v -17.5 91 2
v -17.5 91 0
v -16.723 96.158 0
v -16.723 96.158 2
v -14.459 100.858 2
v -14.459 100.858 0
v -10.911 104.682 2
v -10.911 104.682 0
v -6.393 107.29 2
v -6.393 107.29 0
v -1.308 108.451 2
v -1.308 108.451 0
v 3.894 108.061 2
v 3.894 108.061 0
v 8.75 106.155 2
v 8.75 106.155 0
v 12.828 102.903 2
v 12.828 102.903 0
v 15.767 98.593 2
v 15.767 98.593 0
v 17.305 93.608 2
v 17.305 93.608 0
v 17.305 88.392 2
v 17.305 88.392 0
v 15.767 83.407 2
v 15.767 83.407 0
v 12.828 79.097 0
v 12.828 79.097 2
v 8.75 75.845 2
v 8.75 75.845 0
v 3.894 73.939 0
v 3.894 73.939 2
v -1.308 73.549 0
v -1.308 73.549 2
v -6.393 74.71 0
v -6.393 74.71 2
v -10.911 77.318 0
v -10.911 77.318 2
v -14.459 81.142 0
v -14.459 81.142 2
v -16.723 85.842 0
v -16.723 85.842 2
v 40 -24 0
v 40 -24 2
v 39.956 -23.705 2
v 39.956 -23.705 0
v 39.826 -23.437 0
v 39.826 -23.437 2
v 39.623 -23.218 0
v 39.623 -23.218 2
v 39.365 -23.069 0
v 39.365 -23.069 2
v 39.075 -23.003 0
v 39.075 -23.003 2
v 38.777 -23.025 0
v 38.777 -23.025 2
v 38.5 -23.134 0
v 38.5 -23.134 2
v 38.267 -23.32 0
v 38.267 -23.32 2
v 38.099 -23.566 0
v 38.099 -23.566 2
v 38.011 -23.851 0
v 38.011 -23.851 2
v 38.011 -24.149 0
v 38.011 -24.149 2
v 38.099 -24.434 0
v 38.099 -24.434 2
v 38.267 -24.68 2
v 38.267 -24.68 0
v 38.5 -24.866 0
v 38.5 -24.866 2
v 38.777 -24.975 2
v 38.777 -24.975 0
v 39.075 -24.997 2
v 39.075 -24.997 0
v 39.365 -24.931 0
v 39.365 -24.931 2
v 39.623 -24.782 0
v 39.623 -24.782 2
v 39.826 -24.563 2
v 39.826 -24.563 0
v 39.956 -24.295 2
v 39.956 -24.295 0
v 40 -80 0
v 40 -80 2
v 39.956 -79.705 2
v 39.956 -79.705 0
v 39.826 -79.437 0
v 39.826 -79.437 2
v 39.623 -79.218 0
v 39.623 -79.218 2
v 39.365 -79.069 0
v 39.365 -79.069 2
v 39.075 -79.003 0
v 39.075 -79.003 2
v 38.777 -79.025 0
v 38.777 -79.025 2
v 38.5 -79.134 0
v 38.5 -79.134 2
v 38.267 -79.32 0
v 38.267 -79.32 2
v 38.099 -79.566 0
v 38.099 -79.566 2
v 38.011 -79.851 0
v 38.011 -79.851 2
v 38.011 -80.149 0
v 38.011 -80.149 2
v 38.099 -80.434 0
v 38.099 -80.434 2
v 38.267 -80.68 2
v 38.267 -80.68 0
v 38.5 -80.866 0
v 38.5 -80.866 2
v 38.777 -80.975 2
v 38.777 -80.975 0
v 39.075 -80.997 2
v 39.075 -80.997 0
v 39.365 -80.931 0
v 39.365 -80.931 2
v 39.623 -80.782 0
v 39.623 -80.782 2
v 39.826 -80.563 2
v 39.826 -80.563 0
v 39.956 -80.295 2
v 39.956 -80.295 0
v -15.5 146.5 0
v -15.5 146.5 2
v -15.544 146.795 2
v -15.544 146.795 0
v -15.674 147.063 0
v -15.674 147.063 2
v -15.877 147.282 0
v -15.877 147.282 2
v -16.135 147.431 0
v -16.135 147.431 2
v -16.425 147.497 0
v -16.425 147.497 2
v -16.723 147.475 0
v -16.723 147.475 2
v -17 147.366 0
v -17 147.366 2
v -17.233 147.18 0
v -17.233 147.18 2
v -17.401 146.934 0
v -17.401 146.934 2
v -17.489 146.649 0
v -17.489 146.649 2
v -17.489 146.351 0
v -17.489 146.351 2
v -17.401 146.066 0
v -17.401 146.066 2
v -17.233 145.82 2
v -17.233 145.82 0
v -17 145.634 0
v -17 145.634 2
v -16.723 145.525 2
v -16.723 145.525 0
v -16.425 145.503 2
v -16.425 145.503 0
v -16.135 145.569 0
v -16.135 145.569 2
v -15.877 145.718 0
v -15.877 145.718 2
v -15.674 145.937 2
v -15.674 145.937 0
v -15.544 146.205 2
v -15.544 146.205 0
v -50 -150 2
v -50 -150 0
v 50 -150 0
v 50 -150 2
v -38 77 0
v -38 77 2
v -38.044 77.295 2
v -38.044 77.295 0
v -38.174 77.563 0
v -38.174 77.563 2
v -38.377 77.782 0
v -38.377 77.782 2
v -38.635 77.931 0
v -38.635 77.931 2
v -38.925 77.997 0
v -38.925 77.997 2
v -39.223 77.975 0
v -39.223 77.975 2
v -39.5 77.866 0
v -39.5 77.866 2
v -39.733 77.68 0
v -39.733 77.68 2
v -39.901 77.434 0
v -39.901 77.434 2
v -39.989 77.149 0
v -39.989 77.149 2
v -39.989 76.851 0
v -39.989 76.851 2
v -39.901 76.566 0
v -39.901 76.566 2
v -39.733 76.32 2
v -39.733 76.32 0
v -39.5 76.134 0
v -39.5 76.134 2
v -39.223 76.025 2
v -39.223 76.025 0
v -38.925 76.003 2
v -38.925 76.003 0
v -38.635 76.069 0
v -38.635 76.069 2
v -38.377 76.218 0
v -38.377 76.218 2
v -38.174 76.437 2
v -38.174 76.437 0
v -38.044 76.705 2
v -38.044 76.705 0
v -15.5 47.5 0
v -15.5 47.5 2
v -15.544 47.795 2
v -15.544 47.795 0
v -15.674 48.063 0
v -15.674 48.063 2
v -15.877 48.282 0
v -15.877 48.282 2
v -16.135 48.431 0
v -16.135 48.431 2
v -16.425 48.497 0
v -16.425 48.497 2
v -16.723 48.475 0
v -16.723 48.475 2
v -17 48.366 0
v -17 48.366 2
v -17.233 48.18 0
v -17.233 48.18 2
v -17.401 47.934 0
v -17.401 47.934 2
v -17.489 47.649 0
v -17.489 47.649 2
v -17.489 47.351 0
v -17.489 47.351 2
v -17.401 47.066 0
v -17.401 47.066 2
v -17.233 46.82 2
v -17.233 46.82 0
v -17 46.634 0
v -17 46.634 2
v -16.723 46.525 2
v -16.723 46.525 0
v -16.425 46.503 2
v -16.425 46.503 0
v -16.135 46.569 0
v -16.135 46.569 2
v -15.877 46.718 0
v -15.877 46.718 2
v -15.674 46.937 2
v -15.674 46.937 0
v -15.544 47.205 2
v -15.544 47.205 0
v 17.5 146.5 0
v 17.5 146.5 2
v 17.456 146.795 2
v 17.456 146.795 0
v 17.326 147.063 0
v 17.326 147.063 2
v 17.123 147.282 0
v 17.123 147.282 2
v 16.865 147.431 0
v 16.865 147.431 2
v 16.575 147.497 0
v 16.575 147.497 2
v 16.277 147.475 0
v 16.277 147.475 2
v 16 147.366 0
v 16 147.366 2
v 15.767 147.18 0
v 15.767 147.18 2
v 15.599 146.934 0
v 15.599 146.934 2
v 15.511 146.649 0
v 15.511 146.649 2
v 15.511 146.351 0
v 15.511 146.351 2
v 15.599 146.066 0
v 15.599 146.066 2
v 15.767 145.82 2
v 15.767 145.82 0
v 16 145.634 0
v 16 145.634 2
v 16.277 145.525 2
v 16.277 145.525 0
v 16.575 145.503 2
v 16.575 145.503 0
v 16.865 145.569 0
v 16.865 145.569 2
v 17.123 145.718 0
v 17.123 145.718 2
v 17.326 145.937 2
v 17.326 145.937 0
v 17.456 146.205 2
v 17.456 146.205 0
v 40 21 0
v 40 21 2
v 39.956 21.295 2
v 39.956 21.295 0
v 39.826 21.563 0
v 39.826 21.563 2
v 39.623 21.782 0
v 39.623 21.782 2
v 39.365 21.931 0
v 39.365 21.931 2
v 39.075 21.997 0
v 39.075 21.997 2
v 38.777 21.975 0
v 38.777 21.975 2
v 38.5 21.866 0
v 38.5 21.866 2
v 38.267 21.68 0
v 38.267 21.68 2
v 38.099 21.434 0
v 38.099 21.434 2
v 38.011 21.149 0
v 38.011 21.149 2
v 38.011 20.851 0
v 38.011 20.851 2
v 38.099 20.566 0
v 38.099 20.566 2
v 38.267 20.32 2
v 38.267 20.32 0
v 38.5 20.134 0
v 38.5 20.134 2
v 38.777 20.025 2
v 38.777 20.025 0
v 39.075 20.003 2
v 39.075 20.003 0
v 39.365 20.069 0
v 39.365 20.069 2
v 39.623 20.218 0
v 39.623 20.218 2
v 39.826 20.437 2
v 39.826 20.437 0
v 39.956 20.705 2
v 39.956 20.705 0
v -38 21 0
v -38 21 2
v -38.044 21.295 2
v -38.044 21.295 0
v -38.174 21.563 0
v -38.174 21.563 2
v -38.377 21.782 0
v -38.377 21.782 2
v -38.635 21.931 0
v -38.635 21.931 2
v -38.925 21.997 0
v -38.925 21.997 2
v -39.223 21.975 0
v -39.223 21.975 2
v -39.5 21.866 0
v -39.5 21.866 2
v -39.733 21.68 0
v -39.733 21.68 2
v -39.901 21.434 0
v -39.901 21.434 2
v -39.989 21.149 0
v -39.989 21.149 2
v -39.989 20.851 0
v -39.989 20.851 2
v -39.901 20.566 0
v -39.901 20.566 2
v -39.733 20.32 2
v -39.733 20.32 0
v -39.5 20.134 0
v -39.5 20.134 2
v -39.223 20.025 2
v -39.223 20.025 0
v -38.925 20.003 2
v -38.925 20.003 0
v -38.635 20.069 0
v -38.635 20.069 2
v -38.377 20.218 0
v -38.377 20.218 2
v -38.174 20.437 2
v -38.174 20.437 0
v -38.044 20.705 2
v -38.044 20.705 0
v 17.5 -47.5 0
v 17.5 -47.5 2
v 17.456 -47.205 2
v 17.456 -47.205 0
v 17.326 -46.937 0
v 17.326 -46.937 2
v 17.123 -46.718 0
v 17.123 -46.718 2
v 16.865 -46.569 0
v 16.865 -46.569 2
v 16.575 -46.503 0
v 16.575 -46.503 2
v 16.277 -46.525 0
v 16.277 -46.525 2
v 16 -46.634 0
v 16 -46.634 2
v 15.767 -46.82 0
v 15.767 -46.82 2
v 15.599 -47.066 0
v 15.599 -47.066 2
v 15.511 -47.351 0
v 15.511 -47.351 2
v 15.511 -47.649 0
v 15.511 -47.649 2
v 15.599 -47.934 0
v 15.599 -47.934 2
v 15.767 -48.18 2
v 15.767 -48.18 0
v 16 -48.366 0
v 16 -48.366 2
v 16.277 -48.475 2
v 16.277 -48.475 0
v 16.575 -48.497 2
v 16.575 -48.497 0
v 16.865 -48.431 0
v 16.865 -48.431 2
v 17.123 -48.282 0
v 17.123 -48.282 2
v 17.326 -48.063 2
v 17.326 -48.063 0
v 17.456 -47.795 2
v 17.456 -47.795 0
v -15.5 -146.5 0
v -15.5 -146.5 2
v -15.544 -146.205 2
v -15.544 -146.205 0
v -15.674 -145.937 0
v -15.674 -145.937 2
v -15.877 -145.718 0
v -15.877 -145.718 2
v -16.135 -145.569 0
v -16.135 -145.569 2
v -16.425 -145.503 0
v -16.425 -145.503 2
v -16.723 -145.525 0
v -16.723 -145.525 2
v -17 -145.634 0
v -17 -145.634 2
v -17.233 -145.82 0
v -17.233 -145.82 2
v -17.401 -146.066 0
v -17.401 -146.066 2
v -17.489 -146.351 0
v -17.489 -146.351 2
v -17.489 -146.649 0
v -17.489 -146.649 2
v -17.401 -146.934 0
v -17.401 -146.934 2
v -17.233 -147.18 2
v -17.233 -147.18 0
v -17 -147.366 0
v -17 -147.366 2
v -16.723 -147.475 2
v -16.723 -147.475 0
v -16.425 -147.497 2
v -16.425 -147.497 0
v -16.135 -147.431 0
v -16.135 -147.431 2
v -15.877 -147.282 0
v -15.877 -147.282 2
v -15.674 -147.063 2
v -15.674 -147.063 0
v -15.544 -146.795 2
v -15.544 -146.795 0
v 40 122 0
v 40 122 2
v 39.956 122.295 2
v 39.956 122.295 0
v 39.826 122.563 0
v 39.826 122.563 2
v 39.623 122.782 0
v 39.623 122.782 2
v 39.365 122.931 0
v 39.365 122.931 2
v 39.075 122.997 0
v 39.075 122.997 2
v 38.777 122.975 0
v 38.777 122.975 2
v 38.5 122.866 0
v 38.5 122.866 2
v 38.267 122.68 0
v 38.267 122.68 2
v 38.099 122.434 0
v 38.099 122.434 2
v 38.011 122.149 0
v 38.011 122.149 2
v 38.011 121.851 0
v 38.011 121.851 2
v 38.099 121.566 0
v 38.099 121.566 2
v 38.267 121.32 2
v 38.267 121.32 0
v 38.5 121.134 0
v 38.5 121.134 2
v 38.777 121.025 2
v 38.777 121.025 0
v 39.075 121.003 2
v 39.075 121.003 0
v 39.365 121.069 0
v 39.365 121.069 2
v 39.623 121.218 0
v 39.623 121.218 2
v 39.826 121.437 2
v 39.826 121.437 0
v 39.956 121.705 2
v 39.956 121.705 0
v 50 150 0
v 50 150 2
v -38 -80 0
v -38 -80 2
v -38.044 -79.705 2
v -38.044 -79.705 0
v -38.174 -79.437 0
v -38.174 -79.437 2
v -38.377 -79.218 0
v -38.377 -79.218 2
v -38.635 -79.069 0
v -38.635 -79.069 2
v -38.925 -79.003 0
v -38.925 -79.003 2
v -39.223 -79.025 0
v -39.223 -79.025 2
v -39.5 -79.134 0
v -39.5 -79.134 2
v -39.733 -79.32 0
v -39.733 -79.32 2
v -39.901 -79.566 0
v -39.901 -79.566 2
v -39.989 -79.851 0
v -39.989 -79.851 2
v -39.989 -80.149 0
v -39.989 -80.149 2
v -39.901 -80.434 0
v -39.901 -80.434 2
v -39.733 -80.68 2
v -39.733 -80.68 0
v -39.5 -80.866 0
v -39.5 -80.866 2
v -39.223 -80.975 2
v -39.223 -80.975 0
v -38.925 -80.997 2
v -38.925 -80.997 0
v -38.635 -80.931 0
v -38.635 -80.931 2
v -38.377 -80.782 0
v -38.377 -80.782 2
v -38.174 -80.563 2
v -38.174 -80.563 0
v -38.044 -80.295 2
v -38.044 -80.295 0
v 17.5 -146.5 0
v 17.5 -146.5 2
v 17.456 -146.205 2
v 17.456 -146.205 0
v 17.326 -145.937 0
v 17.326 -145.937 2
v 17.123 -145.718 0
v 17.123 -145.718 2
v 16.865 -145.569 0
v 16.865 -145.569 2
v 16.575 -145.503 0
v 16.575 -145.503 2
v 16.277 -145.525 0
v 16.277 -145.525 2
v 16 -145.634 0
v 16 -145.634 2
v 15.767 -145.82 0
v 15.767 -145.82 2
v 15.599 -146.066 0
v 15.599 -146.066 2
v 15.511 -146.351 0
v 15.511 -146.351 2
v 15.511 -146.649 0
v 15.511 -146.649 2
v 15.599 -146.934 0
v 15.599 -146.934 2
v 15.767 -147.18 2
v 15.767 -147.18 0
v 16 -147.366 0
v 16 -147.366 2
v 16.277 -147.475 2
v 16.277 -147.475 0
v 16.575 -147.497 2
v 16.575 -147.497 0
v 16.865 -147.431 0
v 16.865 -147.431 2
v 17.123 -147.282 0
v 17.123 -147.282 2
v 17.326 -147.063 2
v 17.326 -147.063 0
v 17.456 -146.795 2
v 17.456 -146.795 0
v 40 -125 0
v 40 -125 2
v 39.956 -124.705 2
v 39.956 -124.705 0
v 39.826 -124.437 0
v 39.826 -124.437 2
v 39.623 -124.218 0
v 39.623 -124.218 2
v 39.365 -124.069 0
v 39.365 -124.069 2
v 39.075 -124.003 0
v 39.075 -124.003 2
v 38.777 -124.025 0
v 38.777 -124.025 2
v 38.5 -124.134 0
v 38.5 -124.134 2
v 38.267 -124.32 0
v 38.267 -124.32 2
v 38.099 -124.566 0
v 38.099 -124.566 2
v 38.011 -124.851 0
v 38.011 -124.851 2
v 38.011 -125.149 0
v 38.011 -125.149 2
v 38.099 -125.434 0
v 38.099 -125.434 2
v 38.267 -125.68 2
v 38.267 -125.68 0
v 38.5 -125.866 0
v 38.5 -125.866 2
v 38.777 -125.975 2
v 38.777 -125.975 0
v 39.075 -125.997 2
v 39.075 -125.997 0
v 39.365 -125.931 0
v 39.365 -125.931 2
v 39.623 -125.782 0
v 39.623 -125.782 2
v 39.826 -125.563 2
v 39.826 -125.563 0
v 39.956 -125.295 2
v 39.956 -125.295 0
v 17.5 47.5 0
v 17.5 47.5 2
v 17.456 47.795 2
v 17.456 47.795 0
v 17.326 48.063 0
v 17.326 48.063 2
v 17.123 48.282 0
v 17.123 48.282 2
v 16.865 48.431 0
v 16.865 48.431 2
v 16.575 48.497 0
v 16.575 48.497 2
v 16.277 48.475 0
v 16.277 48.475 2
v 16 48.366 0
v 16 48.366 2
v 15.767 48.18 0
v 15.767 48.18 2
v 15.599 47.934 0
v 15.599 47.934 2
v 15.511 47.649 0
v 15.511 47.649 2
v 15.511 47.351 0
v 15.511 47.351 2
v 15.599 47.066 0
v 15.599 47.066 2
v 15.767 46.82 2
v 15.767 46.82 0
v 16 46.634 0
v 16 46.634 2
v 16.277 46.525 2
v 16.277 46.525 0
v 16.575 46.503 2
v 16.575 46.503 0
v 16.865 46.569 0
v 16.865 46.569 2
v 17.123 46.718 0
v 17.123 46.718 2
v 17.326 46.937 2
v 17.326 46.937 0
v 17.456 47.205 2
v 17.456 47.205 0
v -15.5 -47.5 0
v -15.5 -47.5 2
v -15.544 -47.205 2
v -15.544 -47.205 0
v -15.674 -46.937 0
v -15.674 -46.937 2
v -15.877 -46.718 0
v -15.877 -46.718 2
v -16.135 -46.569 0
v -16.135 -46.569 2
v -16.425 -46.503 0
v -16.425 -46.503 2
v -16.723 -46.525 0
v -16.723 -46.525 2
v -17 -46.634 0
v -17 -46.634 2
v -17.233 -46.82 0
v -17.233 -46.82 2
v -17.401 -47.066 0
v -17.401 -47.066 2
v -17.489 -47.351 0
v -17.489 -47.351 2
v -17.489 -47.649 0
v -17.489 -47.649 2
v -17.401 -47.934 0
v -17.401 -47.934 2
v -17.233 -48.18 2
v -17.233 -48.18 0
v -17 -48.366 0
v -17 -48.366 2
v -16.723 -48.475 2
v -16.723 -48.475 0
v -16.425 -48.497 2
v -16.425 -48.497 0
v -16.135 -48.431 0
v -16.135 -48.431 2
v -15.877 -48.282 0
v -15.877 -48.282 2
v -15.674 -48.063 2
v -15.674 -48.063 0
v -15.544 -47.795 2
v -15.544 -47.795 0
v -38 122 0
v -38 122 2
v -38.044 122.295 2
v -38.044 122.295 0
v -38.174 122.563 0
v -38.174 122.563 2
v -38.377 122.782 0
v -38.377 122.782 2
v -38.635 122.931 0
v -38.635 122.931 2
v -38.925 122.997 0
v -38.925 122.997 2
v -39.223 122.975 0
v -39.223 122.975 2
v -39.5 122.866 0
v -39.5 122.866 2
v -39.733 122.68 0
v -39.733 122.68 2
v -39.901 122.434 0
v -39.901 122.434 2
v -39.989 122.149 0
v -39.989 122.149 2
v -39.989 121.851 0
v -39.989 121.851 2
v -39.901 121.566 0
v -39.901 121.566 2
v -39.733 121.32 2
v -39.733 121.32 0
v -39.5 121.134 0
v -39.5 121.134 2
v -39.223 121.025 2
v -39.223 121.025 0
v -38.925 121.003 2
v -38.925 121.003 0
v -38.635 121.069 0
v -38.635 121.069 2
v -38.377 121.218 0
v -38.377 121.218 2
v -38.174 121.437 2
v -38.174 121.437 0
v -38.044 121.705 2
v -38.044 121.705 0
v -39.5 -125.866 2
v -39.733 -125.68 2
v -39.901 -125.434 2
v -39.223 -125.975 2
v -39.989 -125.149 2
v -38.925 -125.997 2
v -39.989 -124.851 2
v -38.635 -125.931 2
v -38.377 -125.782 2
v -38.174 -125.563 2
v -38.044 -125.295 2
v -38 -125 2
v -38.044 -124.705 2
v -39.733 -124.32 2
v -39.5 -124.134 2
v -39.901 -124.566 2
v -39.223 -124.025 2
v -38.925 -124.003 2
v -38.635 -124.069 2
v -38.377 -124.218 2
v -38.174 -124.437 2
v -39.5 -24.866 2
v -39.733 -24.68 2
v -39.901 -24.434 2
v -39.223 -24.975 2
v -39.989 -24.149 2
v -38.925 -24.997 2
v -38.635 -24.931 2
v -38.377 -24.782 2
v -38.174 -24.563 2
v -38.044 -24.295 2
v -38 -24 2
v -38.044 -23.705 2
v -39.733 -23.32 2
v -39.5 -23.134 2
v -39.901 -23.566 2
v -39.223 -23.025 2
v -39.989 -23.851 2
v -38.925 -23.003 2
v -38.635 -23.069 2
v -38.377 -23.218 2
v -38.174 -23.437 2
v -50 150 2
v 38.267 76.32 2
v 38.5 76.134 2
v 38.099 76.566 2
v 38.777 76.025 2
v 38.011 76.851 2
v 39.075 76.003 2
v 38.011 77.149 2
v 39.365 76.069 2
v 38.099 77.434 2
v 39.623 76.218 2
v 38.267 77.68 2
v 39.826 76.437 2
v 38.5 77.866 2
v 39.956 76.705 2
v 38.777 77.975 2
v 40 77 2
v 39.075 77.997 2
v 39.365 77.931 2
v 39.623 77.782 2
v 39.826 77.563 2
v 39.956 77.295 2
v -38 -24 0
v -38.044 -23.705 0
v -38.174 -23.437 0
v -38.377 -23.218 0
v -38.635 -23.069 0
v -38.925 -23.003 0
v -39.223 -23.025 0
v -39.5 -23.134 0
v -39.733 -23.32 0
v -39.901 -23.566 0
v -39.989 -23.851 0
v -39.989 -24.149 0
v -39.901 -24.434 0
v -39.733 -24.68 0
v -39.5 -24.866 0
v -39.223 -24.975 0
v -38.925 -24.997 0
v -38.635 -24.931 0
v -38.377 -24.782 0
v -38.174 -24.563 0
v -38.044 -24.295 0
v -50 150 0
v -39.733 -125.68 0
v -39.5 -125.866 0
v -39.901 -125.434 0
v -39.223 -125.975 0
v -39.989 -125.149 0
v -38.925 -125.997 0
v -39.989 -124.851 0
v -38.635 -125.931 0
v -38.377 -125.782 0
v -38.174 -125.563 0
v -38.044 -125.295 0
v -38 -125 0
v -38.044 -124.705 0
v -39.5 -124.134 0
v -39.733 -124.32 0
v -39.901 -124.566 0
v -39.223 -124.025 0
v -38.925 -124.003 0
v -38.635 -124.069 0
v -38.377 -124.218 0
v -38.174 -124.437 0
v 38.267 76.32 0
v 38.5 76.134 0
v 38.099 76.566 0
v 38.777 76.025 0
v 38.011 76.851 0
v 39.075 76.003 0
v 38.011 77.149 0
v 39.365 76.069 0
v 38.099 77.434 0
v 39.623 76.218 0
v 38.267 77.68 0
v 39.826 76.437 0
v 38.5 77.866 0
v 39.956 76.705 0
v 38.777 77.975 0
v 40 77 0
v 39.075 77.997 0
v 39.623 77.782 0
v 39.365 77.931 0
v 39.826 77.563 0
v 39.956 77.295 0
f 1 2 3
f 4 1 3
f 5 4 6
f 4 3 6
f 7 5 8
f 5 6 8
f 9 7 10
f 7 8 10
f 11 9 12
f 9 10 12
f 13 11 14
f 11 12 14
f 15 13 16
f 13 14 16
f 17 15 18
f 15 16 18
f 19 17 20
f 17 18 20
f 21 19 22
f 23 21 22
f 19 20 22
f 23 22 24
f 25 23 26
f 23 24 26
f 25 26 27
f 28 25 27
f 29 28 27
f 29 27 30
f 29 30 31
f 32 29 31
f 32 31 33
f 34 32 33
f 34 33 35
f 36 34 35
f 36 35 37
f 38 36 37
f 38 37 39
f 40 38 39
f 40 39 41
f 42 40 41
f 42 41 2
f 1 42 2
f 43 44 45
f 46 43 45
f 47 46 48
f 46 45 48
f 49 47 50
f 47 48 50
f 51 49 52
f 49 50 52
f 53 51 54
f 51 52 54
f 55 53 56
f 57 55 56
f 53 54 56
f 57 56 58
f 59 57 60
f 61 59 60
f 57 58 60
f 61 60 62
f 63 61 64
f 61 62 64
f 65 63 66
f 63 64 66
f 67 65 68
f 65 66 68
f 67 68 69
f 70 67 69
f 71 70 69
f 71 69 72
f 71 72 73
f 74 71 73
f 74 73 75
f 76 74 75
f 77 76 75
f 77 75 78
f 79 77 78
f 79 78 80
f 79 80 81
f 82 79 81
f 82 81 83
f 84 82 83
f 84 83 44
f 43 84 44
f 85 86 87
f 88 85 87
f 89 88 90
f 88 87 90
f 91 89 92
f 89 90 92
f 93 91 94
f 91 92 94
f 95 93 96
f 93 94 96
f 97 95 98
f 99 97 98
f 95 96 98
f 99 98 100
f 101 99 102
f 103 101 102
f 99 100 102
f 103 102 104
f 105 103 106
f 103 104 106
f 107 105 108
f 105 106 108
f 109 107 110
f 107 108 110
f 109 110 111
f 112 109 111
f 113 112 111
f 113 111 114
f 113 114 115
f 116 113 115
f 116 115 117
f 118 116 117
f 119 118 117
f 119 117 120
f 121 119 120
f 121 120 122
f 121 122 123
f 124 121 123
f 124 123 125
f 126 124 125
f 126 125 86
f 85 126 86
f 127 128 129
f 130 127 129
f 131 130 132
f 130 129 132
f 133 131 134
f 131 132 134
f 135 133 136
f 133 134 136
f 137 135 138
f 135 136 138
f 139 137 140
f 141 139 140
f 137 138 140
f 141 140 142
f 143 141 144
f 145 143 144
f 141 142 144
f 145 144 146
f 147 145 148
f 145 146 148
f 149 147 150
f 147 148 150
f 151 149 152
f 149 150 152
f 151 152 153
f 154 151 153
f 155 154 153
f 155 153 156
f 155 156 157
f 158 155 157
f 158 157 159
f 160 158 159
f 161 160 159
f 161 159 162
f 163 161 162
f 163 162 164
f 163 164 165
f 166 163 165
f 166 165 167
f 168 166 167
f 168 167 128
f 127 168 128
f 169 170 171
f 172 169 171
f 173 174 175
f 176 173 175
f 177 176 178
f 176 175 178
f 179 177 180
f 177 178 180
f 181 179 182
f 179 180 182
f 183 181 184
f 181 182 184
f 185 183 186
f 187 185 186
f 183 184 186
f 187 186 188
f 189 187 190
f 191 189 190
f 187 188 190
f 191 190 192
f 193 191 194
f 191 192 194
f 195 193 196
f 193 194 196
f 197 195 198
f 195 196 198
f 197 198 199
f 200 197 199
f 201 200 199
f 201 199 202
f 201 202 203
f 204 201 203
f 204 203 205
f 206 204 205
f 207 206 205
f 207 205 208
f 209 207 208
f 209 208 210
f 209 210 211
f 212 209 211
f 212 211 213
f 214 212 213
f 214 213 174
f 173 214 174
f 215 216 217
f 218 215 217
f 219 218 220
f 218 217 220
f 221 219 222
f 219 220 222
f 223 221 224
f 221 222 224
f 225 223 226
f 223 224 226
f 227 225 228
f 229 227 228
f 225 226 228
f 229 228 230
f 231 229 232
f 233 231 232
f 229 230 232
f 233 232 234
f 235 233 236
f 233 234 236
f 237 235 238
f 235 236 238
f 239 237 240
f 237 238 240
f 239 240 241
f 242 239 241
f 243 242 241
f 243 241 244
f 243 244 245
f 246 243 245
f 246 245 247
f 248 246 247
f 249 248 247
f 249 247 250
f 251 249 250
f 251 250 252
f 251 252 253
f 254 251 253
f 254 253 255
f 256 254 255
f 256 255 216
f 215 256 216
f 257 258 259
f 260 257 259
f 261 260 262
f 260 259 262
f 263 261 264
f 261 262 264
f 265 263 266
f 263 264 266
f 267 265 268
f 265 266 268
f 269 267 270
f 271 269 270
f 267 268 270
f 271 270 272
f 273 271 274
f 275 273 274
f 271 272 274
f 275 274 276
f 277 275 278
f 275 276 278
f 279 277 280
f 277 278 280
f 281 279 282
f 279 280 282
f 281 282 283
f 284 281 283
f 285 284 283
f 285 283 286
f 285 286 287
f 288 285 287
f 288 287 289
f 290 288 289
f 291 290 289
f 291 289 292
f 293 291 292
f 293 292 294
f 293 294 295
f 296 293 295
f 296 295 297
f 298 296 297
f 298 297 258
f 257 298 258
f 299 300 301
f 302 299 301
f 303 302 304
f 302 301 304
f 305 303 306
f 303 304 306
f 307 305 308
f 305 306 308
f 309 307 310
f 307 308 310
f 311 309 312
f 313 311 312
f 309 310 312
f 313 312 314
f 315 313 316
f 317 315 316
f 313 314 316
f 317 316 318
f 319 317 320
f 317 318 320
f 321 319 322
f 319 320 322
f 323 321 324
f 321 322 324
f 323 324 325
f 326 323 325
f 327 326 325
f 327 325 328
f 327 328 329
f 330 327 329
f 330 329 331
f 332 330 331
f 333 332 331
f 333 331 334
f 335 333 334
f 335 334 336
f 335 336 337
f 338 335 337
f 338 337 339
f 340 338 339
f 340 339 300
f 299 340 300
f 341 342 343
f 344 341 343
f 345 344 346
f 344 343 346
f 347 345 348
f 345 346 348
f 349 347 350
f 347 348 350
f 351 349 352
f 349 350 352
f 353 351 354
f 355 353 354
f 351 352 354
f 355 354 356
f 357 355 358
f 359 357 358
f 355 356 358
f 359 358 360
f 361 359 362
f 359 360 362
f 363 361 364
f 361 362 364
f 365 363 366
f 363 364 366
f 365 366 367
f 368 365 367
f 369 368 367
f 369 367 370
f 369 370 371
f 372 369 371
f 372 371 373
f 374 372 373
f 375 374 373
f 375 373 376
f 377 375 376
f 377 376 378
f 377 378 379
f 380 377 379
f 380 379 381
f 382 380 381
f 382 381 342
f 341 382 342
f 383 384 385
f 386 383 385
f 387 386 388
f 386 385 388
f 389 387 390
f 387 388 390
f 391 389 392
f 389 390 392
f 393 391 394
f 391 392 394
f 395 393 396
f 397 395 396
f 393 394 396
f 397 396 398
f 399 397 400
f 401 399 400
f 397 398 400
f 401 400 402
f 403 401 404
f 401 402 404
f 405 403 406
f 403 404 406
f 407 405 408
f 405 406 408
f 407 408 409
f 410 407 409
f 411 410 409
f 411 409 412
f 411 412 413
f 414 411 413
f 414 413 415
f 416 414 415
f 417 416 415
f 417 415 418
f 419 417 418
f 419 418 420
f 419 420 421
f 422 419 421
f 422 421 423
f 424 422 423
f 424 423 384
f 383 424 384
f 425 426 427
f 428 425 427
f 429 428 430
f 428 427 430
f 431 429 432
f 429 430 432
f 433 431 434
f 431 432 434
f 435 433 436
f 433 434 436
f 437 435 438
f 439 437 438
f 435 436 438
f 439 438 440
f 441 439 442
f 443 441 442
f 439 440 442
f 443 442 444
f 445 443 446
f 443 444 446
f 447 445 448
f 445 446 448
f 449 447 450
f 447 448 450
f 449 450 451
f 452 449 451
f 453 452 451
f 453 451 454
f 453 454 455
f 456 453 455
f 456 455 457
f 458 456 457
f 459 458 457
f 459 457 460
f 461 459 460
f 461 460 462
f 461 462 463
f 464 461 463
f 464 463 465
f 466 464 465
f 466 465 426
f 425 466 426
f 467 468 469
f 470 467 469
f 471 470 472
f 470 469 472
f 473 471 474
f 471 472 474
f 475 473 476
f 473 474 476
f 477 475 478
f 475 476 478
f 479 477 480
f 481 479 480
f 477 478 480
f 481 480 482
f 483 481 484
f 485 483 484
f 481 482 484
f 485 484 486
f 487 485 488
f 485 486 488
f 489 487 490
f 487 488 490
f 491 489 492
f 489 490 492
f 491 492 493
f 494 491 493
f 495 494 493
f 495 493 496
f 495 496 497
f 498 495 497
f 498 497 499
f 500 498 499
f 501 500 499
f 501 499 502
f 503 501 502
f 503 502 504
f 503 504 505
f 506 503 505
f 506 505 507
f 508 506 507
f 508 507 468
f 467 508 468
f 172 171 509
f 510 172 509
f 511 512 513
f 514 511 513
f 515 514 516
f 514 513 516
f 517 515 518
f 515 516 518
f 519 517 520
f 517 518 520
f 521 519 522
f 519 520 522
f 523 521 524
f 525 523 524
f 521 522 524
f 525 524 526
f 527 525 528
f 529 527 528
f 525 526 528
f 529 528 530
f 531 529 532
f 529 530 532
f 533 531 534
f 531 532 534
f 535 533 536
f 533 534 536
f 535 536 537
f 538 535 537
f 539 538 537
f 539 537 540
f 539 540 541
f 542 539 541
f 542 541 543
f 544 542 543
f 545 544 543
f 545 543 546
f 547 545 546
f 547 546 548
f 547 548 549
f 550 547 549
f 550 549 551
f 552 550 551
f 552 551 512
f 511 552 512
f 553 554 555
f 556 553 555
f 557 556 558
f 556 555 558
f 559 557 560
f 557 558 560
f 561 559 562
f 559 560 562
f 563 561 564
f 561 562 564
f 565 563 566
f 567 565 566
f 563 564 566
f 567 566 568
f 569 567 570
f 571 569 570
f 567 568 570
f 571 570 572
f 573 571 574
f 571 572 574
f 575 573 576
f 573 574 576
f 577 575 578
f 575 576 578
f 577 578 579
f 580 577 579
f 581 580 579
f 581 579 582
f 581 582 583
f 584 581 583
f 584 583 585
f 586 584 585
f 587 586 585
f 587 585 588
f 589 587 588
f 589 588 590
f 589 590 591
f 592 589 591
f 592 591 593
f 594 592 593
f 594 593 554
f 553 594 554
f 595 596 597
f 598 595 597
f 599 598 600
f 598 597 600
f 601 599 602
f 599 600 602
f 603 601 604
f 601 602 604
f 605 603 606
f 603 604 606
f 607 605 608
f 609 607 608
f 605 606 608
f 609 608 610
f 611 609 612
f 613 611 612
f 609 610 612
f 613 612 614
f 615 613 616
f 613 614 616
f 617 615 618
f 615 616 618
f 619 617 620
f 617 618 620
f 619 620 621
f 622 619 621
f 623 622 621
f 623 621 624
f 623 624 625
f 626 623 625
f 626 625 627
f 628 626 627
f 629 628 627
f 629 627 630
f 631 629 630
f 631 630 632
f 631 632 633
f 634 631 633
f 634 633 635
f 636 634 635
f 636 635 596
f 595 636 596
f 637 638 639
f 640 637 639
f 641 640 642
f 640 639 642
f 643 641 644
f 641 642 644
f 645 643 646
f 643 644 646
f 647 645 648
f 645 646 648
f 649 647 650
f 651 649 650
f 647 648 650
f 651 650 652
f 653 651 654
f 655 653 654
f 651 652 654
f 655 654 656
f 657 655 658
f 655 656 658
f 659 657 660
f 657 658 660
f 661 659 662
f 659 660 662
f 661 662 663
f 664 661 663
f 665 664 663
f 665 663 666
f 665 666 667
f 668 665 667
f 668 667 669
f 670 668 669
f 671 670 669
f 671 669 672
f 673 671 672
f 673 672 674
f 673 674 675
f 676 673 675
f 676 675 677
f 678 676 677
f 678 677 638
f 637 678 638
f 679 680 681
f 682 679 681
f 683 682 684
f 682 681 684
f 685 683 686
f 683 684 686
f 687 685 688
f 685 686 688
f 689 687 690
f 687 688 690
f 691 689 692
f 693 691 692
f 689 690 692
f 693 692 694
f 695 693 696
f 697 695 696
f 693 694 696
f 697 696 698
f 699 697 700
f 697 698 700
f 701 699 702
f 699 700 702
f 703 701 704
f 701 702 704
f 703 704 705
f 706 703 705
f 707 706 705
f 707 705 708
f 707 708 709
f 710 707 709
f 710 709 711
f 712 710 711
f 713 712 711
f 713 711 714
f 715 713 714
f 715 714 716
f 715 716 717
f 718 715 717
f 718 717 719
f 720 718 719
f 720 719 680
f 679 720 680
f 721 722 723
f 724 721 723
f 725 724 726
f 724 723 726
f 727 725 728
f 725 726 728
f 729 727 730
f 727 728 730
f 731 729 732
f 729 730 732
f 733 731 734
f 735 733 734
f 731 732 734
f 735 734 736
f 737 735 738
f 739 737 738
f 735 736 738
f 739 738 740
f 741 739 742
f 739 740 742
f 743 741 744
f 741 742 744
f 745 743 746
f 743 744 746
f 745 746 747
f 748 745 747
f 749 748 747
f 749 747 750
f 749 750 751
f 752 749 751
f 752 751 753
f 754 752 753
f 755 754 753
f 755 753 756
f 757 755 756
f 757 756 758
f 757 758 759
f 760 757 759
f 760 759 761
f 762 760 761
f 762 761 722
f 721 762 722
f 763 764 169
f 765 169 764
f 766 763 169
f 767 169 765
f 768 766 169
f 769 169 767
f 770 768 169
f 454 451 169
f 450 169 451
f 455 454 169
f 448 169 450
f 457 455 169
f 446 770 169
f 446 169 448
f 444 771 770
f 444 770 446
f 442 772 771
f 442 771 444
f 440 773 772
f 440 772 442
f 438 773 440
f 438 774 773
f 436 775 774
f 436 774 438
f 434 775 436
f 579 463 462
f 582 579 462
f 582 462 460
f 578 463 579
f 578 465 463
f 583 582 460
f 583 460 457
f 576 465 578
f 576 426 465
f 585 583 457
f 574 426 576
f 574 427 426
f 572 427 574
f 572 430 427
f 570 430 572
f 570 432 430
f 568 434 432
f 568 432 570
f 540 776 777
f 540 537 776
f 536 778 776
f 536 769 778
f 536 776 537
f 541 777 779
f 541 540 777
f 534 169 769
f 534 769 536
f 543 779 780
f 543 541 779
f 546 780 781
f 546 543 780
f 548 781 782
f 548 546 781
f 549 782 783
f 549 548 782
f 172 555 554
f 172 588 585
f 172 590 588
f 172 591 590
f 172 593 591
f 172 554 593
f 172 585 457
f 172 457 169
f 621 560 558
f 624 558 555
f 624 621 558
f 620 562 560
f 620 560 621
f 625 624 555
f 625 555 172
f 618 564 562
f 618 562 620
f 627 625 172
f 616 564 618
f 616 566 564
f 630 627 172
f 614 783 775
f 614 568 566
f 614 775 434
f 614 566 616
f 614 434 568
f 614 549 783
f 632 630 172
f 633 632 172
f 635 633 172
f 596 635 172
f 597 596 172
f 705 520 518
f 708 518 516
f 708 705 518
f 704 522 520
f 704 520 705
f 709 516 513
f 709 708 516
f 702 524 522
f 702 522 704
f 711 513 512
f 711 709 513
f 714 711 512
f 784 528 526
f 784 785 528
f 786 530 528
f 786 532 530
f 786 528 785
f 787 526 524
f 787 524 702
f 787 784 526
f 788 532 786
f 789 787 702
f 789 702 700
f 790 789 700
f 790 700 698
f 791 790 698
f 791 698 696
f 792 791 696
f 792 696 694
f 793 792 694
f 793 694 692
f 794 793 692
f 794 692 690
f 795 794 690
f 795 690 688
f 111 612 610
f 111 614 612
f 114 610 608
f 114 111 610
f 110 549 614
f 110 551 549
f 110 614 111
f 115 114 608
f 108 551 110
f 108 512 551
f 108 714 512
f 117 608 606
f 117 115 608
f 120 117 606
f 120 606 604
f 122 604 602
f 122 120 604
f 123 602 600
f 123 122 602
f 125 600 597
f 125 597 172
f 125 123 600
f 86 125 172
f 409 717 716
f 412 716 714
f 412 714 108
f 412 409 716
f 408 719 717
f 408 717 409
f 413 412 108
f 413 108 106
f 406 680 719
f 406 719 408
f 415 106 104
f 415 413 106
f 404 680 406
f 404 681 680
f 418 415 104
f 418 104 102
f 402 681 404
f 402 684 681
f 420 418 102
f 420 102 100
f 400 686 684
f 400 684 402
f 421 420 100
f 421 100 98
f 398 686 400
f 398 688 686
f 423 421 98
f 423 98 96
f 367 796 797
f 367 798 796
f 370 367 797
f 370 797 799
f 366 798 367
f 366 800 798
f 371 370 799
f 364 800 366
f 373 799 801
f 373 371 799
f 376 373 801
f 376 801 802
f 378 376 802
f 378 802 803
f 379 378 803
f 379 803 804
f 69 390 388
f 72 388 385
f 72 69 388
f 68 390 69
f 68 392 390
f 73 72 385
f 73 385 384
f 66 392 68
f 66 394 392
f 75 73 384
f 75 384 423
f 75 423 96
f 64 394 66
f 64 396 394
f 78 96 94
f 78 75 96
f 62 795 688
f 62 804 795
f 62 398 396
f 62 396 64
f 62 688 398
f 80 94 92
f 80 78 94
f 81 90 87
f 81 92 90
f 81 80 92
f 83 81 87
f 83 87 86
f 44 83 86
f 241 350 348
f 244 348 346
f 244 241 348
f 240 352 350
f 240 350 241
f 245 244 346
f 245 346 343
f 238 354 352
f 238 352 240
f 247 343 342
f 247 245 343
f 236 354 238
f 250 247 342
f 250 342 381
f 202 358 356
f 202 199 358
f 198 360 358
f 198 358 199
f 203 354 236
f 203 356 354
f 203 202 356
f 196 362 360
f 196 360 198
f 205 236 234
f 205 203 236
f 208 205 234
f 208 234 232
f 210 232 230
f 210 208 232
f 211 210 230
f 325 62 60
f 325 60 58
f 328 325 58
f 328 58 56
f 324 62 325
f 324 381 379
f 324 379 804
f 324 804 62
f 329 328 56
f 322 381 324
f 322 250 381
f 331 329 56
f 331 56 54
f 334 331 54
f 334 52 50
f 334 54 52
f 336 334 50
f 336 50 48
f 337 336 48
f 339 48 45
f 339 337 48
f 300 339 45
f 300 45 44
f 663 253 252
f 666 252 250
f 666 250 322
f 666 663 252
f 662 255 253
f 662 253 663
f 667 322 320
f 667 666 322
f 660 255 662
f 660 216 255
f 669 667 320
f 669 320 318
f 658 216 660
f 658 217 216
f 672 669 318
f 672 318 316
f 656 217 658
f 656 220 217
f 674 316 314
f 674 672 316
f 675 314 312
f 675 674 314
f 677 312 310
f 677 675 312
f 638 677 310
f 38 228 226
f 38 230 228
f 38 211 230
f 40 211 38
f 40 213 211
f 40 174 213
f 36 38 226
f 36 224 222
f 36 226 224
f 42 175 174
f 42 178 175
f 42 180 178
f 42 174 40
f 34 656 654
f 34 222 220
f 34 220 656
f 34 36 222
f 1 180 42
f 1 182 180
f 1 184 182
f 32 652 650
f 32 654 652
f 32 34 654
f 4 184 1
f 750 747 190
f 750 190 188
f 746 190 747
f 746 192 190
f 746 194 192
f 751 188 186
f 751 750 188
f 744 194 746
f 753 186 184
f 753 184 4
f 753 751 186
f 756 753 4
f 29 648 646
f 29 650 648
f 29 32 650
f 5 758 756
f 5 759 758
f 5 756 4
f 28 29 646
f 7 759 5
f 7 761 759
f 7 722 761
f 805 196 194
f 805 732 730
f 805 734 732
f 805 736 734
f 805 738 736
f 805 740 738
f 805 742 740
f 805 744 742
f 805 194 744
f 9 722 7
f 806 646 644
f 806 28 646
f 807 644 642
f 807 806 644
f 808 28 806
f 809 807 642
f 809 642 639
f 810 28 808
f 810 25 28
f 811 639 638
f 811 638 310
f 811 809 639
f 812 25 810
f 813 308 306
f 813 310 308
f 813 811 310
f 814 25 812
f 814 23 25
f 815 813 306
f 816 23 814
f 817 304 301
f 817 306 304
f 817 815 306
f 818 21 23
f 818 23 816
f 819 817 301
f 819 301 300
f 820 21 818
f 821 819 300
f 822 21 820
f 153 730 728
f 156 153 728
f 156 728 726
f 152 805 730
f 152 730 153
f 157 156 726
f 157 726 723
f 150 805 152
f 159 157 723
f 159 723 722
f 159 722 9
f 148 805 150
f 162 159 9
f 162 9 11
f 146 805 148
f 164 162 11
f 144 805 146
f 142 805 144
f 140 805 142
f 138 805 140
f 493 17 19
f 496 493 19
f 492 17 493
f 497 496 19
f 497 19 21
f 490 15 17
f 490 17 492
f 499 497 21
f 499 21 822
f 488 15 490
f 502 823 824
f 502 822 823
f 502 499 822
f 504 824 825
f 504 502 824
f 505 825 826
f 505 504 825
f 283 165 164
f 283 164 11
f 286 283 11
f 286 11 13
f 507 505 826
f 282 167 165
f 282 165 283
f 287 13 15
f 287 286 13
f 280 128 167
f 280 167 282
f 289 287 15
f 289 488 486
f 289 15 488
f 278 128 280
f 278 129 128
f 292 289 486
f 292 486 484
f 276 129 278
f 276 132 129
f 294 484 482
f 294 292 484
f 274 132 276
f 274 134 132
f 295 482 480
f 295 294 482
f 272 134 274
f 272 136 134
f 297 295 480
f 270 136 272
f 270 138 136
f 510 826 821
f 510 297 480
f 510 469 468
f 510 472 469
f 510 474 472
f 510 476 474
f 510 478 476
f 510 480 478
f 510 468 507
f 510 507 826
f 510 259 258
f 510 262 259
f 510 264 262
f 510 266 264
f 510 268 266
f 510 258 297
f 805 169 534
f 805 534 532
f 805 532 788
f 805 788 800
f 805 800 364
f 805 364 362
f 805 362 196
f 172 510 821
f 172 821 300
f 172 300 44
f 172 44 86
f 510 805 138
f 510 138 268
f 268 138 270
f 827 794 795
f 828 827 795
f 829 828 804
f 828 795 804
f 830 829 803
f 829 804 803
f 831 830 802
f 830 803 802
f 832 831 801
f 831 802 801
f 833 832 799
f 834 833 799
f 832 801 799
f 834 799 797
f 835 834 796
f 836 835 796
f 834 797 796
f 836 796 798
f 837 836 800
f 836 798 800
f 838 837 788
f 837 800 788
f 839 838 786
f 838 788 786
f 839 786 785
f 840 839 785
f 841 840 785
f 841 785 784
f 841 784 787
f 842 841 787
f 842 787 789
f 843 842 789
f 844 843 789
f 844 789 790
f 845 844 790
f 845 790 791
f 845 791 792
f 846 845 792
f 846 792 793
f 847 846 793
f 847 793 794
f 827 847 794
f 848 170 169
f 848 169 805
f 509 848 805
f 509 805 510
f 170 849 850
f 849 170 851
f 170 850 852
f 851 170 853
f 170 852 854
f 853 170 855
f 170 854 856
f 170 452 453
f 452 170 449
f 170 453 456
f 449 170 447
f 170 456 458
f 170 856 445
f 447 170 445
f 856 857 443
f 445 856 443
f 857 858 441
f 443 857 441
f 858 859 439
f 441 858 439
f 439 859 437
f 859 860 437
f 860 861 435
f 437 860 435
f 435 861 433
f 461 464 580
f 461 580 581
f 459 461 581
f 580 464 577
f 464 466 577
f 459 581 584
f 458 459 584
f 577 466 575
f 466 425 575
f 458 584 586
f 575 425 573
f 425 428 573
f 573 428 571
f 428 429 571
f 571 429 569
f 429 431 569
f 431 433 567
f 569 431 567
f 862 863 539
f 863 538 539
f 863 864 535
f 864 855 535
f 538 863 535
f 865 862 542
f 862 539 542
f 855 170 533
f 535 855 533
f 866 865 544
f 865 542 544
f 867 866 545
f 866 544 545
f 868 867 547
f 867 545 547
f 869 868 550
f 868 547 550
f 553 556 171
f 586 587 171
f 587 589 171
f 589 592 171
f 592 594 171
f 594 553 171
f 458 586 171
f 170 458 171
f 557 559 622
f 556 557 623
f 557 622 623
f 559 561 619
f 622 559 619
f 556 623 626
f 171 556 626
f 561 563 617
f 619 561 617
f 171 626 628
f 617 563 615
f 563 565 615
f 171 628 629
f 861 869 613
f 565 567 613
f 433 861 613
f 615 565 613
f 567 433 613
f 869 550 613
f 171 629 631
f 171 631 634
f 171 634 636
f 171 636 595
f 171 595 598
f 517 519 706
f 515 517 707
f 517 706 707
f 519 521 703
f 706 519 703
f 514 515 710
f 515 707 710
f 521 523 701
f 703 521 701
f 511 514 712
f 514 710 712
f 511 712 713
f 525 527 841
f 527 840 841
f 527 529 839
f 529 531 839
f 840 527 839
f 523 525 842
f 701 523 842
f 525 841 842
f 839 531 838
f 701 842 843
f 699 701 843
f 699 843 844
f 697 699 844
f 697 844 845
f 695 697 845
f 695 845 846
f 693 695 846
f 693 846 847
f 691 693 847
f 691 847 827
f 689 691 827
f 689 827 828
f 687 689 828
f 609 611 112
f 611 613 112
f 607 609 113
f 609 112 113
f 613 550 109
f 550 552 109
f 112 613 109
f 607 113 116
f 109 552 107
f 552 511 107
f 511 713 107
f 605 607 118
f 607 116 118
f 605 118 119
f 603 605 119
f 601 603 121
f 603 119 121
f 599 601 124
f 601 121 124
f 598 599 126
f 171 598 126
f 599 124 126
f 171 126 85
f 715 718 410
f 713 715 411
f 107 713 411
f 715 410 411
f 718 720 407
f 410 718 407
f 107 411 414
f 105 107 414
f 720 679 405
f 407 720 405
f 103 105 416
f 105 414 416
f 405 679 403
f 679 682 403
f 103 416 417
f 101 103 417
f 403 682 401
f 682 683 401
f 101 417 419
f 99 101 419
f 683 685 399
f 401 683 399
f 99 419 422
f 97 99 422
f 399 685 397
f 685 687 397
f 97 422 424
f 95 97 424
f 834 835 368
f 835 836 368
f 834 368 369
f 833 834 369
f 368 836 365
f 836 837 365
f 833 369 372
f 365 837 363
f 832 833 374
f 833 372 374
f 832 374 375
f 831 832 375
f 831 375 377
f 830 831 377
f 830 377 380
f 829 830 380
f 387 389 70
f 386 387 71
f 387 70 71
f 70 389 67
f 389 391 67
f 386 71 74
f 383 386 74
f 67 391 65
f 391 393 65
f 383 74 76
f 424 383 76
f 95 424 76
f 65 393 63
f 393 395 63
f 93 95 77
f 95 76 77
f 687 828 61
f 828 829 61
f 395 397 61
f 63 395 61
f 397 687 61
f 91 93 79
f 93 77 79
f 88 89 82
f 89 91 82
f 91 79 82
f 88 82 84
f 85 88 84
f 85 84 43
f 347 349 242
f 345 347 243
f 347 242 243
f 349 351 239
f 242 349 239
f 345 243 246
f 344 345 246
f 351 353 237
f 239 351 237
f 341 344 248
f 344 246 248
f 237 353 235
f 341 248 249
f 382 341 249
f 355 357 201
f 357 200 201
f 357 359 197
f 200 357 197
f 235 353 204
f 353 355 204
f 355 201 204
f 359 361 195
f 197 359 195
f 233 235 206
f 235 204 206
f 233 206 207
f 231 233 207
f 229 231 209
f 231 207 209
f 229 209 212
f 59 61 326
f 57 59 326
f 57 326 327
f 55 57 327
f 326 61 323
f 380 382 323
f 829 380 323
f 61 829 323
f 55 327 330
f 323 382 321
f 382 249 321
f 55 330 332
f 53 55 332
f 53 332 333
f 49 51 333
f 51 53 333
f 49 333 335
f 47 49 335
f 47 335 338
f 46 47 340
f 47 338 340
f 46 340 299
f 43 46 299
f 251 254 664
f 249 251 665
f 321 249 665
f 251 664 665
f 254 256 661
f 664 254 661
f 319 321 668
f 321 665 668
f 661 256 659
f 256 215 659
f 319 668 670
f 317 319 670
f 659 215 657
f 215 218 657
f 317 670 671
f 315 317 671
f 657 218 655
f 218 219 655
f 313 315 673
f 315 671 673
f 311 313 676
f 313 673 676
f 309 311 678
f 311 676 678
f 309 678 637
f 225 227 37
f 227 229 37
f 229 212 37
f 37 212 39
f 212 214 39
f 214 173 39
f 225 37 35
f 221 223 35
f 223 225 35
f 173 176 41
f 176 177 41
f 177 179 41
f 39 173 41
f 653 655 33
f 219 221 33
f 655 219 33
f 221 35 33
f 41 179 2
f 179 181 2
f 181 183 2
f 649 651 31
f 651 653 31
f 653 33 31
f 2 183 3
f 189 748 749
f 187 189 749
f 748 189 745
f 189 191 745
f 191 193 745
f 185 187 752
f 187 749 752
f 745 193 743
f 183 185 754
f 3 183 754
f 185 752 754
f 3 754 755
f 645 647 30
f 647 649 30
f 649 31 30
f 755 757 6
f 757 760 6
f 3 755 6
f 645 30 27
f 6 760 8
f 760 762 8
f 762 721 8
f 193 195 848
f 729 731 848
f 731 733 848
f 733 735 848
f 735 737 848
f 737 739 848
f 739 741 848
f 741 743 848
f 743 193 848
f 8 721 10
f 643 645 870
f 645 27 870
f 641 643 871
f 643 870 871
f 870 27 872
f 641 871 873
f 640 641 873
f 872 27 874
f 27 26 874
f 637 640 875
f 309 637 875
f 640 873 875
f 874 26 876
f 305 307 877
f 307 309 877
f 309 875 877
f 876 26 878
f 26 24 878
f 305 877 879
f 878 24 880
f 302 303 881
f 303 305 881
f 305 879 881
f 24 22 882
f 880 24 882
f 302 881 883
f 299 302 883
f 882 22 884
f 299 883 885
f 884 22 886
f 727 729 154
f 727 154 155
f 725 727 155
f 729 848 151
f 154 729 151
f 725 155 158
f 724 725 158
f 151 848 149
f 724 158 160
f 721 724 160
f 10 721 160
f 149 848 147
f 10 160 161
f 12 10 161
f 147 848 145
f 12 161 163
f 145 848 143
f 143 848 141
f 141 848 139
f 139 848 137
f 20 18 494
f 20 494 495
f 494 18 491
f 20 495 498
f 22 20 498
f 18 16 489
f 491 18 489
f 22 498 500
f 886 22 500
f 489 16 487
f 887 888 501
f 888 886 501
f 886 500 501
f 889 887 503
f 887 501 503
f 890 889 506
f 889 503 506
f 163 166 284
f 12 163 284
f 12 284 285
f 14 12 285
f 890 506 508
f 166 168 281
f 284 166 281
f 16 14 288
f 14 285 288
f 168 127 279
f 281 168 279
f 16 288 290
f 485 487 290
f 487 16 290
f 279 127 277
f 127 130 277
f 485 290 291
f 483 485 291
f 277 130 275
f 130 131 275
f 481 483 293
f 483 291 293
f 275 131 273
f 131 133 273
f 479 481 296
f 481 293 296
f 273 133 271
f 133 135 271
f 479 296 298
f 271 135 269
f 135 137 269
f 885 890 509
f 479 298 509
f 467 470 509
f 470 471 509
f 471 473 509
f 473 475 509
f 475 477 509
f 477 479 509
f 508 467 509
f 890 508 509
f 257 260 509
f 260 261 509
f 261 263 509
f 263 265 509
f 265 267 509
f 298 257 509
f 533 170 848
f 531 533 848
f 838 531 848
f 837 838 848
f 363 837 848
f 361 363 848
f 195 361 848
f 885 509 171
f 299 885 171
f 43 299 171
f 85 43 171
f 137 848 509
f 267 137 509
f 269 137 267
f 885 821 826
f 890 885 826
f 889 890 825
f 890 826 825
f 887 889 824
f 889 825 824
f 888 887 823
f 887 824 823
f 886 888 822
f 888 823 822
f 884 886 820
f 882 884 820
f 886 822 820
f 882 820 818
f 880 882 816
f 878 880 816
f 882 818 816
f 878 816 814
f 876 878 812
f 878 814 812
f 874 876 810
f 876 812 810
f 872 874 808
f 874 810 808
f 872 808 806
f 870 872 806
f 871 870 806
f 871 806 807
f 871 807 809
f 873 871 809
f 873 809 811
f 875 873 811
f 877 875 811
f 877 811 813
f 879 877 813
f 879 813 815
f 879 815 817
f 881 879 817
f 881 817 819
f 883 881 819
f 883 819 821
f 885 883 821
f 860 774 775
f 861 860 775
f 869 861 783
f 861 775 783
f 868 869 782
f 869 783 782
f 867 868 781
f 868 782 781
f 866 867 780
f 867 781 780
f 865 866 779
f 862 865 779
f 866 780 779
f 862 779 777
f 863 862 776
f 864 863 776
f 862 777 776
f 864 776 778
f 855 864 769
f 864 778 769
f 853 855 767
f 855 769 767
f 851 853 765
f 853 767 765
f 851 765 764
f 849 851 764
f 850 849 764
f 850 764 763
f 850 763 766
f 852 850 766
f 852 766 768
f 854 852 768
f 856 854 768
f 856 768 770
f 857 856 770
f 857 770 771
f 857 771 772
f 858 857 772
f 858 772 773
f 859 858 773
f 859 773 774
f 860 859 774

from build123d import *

# Parameters (mm, degrees)
SKETCH1_W           = 100
SKETCH1_H           = 300
BOSS_EXTRUDE1_DEPTH = 2
SKETCH2_R           = 1
CUT_EXTRUDE1_DEPTH  = 10
SKETCH3_R           = 17.5
CUT_EXTRUDE2_DEPTH  = 10
SKETCH5_R           = 1
CUT_EXTRUDE3_DEPTH  = 10


with BuildPart() as part:
    # Sketch1 → Boss-Extrude1 (new body)
    with BuildSketch(Plane.XY):
        Rectangle(SKETCH1_W, SKETCH1_H)
    extrude(amount=BOSS_EXTRUDE1_DEPTH)

    # Sketch2 → Cut-Extrude1 (cut)
    with BuildSketch(Plane.XY.offset(2)):
        with Locations((-39, 122)):
            Circle(SKETCH2_R)
        with Locations((-39, 77)):
            Circle(SKETCH2_R)
        with Locations((39, 122)):
            Circle(SKETCH2_R)
        with Locations((39, 77)):
            Circle(SKETCH2_R)
        with Locations((-39, 21)):
            Circle(SKETCH2_R)
        with Locations((-39, -24)):
            Circle(SKETCH2_R)
        with Locations((39, 21)):
            Circle(SKETCH2_R)
        with Locations((39, -24)):
            Circle(SKETCH2_R)
        with Locations((-39, -80)):
            Circle(SKETCH2_R)
        with Locations((-39, -125)):
            Circle(SKETCH2_R)
        with Locations((39, -80)):
            Circle(SKETCH2_R)
        with Locations((39, -125)):
            Circle(SKETCH2_R)
        with Locations((16.5, -146.5)):
            Circle(SKETCH2_R)
        with Locations((-16.5, -146.5)):
            Circle(SKETCH2_R)
        with Locations((-16.5, 146.5)):
            Circle(SKETCH2_R)
        with Locations((16.5, 146.5)):
            Circle(SKETCH2_R)
    extrude(amount=-CUT_EXTRUDE1_DEPTH, mode=Mode.SUBTRACT)

    # Sketch3 → Cut-Extrude2 (cut)
    with BuildSketch(Plane(origin=(0, 0, 0), x_dir=(-1, 0, 0), z_dir=(0, 0, -1))):
        with Locations((0, 91)):
            Circle(SKETCH3_R)
    extrude(amount=-CUT_EXTRUDE2_DEPTH, mode=Mode.SUBTRACT)

    # Sketch5 → Cut-Extrude3 (cut)
    with BuildSketch(Plane.XY.offset(2)):
        with Locations((-16.5, 47.5)):
            Circle(SKETCH5_R)
        with Locations((16.5, 47.5)):
            Circle(SKETCH5_R)
        with Locations((-16.5, -47.5)):
            Circle(SKETCH5_R)
        with Locations((16.5, -47.5)):
            Circle(SKETCH5_R)
    extrude(amount=-CUT_EXTRUDE3_DEPTH, mode=Mode.SUBTRACT)


solid = part.part
